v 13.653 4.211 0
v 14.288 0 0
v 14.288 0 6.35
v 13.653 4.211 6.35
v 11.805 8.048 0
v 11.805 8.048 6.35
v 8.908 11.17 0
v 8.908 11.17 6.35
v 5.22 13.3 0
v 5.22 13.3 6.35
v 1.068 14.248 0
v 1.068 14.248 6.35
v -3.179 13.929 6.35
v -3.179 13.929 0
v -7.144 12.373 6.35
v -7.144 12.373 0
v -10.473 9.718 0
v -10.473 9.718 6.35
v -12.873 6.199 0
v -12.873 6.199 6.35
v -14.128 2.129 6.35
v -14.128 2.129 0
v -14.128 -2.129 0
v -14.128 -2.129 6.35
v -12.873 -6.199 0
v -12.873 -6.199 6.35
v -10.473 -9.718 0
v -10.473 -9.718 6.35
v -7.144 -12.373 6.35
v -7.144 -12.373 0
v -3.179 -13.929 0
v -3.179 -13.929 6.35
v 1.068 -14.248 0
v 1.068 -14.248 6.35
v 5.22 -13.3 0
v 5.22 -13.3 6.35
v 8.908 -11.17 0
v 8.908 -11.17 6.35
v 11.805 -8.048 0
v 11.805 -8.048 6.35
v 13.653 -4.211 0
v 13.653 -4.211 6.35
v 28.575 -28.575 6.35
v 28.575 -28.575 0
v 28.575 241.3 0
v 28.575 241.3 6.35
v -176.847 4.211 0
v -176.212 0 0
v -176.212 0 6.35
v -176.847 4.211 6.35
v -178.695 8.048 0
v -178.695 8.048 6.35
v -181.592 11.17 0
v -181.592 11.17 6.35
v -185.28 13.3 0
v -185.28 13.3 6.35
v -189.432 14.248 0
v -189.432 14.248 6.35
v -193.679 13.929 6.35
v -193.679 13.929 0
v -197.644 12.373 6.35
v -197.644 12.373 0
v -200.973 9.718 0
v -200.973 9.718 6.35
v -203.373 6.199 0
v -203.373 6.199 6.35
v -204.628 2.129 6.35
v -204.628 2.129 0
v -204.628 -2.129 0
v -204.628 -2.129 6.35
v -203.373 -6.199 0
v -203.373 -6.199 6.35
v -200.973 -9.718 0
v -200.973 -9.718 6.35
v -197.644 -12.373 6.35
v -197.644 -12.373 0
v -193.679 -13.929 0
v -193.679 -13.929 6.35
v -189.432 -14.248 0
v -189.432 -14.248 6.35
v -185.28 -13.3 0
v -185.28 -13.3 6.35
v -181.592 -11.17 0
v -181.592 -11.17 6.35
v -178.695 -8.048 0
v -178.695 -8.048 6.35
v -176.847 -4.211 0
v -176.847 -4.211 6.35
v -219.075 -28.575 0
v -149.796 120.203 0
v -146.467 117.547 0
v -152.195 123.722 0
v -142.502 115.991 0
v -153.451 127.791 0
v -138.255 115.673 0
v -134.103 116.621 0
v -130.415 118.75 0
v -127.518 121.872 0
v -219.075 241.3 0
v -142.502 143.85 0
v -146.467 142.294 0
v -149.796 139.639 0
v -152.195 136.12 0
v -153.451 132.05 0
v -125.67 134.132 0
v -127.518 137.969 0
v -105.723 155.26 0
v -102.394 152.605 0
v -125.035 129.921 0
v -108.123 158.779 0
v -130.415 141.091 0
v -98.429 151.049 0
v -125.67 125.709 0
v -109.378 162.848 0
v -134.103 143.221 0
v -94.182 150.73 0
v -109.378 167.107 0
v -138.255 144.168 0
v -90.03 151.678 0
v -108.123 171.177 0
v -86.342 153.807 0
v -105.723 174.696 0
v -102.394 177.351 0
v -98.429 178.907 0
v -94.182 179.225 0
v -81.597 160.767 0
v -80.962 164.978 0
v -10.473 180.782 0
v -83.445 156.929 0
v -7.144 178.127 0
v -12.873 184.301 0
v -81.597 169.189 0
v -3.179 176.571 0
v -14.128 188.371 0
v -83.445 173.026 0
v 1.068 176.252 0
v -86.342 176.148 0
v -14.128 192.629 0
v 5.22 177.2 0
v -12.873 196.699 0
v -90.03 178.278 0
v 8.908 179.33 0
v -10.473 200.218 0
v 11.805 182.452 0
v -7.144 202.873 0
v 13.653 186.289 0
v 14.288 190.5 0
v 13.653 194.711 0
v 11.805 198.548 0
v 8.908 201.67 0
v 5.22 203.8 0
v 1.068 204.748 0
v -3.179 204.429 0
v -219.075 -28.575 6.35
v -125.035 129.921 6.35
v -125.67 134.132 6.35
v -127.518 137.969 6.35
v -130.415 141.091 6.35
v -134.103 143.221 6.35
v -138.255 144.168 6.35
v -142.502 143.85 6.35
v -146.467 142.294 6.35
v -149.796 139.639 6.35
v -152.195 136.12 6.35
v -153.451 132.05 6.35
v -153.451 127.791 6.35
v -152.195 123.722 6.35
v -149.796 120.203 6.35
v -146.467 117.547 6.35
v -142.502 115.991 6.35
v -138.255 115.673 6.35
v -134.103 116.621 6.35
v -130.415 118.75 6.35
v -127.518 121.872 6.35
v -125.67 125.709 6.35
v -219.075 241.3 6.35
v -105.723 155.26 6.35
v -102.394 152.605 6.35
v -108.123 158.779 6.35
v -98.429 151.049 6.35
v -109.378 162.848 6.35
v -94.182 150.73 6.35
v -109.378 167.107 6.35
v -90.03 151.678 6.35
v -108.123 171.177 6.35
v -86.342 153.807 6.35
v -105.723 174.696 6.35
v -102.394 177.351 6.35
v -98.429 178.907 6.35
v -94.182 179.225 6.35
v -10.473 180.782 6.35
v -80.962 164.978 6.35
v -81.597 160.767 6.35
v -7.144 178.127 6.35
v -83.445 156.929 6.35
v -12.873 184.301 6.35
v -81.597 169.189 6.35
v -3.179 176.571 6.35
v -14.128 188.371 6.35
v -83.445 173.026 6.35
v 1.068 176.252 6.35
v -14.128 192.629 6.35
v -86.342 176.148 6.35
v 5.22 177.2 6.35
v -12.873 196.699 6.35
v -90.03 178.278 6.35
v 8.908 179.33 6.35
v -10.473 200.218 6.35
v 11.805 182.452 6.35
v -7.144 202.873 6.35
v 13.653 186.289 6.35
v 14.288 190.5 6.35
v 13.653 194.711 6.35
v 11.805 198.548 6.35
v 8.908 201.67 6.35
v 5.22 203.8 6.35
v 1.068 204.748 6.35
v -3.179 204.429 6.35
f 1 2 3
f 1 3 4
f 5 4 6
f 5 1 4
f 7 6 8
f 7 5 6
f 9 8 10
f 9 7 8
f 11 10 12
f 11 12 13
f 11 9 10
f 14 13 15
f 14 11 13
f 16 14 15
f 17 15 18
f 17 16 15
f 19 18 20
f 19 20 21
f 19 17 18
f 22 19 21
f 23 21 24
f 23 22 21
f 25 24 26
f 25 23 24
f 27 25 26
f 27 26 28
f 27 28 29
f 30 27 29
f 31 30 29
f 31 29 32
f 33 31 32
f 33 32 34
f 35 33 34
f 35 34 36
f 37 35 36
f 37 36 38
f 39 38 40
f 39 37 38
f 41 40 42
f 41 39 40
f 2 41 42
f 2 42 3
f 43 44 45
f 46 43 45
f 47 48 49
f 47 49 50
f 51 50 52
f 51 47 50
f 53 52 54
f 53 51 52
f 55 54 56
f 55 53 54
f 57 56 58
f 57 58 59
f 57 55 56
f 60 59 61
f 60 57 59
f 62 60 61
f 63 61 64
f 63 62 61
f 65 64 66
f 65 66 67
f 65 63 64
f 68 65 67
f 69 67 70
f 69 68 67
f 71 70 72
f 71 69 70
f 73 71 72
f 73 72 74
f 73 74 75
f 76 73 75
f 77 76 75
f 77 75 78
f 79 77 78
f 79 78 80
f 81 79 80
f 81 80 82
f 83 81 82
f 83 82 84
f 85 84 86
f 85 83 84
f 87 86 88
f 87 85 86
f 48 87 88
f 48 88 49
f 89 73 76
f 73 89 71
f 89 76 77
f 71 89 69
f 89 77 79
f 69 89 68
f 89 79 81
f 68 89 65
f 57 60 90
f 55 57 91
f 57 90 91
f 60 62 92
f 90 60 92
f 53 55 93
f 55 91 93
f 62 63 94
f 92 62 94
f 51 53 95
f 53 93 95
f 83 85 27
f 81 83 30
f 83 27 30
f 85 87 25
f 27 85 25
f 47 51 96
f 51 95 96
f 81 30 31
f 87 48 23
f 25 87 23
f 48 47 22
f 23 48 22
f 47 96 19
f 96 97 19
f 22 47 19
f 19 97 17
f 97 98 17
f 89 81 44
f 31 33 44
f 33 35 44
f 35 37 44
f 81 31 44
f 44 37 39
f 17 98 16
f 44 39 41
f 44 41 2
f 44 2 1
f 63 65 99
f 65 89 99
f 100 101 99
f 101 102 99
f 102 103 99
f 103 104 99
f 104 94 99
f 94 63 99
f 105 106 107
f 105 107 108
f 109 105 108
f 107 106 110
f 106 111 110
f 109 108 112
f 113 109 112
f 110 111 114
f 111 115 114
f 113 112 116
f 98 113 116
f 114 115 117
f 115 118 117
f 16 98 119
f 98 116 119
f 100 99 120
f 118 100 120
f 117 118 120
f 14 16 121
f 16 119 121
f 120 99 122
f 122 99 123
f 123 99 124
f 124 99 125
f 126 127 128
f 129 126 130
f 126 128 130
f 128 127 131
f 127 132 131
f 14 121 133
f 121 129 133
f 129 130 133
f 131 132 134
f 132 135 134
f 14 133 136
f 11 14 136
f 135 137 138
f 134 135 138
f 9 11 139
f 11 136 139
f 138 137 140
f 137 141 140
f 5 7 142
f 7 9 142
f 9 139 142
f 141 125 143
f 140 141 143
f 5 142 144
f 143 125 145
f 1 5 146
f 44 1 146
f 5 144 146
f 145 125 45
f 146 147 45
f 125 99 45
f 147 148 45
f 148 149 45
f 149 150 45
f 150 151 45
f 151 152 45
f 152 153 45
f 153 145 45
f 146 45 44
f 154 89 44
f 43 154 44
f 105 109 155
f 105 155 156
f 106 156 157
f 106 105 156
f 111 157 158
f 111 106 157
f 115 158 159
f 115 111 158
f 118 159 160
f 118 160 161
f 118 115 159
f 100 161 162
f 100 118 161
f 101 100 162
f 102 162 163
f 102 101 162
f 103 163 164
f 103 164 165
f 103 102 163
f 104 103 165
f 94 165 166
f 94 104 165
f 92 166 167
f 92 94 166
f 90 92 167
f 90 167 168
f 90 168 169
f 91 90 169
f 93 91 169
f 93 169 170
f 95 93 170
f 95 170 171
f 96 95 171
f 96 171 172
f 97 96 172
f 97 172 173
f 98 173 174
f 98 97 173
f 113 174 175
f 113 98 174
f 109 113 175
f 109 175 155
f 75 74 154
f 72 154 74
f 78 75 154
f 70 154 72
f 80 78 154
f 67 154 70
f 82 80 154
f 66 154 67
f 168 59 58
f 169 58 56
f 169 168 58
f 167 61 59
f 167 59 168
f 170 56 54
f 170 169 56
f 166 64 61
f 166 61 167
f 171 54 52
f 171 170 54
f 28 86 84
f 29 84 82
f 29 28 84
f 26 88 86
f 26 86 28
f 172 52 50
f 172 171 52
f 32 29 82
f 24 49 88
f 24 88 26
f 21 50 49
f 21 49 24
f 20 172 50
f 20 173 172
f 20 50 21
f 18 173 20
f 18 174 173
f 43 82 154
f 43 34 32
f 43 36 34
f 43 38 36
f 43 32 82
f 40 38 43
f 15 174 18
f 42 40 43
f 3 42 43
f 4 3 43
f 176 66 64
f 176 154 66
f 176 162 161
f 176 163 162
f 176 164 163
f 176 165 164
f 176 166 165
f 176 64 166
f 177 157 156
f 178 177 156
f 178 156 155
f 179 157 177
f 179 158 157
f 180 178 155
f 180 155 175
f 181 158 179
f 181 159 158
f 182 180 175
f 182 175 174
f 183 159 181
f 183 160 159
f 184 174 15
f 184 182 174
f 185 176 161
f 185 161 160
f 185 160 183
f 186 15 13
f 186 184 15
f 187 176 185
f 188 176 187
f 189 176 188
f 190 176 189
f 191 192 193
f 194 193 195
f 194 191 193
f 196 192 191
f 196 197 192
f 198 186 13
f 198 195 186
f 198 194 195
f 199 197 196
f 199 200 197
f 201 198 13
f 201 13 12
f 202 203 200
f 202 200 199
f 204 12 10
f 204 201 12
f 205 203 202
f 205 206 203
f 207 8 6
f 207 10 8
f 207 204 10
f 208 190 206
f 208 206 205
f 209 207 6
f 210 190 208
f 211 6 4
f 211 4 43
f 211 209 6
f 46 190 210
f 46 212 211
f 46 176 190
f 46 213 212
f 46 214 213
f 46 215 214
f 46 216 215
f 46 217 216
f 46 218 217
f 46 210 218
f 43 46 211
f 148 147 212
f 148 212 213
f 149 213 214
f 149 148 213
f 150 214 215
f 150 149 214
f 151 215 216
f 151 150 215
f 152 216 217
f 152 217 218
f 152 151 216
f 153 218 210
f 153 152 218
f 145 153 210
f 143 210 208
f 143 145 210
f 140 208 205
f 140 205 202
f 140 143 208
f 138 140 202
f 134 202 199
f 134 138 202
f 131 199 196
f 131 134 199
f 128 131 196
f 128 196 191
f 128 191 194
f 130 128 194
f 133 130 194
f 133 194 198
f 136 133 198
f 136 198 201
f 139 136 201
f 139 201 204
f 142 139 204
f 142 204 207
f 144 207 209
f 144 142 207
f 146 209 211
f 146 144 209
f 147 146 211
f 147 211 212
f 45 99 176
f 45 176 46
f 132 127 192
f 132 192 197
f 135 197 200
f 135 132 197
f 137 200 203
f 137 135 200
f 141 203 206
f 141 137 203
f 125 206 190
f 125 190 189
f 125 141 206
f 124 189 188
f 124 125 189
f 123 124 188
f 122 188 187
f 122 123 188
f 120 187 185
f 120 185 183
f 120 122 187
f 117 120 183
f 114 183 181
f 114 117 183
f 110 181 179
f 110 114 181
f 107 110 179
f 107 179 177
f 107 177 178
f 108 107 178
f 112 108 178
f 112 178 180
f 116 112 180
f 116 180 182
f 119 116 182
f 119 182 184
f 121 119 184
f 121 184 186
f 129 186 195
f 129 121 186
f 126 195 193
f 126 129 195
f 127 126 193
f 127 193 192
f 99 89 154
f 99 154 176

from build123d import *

# Parameters (mm, degrees)
SKETCH1_W                      = 247.65
SKETCH1_H                      = 269.875
SKETCH1_R                      = 14.2875
I_CAN_CHANGE_THESE_NAMES_DEPTH = 6.35


with BuildPart() as part:
    # Sketch1 → I CAN CHANGE THESE NAMES?! (new body)
    with BuildSketch(Plane.XY):
        with Locations((-95.25, 106.3625)):
            Rectangle(SKETCH1_W, SKETCH1_H)
        Circle(SKETCH1_R, mode=Mode.SUBTRACT)
        with Locations((-190.5, 0)):
            Circle(SKETCH1_R, mode=Mode.SUBTRACT)
        with Locations((-139.322880158, 129.920687592)):
            Circle(SKETCH1_R, mode=Mode.SUBTRACT)
        with Locations((-95.25, 164.977839421)):
            Circle(SKETCH1_R, mode=Mode.SUBTRACT)
        with Locations((0, 190.5)):
            Circle(SKETCH1_R, mode=Mode.SUBTRACT)
    extrude(amount=I_CAN_CHANGE_THESE_NAMES_DEPTH)


solid = part.part
